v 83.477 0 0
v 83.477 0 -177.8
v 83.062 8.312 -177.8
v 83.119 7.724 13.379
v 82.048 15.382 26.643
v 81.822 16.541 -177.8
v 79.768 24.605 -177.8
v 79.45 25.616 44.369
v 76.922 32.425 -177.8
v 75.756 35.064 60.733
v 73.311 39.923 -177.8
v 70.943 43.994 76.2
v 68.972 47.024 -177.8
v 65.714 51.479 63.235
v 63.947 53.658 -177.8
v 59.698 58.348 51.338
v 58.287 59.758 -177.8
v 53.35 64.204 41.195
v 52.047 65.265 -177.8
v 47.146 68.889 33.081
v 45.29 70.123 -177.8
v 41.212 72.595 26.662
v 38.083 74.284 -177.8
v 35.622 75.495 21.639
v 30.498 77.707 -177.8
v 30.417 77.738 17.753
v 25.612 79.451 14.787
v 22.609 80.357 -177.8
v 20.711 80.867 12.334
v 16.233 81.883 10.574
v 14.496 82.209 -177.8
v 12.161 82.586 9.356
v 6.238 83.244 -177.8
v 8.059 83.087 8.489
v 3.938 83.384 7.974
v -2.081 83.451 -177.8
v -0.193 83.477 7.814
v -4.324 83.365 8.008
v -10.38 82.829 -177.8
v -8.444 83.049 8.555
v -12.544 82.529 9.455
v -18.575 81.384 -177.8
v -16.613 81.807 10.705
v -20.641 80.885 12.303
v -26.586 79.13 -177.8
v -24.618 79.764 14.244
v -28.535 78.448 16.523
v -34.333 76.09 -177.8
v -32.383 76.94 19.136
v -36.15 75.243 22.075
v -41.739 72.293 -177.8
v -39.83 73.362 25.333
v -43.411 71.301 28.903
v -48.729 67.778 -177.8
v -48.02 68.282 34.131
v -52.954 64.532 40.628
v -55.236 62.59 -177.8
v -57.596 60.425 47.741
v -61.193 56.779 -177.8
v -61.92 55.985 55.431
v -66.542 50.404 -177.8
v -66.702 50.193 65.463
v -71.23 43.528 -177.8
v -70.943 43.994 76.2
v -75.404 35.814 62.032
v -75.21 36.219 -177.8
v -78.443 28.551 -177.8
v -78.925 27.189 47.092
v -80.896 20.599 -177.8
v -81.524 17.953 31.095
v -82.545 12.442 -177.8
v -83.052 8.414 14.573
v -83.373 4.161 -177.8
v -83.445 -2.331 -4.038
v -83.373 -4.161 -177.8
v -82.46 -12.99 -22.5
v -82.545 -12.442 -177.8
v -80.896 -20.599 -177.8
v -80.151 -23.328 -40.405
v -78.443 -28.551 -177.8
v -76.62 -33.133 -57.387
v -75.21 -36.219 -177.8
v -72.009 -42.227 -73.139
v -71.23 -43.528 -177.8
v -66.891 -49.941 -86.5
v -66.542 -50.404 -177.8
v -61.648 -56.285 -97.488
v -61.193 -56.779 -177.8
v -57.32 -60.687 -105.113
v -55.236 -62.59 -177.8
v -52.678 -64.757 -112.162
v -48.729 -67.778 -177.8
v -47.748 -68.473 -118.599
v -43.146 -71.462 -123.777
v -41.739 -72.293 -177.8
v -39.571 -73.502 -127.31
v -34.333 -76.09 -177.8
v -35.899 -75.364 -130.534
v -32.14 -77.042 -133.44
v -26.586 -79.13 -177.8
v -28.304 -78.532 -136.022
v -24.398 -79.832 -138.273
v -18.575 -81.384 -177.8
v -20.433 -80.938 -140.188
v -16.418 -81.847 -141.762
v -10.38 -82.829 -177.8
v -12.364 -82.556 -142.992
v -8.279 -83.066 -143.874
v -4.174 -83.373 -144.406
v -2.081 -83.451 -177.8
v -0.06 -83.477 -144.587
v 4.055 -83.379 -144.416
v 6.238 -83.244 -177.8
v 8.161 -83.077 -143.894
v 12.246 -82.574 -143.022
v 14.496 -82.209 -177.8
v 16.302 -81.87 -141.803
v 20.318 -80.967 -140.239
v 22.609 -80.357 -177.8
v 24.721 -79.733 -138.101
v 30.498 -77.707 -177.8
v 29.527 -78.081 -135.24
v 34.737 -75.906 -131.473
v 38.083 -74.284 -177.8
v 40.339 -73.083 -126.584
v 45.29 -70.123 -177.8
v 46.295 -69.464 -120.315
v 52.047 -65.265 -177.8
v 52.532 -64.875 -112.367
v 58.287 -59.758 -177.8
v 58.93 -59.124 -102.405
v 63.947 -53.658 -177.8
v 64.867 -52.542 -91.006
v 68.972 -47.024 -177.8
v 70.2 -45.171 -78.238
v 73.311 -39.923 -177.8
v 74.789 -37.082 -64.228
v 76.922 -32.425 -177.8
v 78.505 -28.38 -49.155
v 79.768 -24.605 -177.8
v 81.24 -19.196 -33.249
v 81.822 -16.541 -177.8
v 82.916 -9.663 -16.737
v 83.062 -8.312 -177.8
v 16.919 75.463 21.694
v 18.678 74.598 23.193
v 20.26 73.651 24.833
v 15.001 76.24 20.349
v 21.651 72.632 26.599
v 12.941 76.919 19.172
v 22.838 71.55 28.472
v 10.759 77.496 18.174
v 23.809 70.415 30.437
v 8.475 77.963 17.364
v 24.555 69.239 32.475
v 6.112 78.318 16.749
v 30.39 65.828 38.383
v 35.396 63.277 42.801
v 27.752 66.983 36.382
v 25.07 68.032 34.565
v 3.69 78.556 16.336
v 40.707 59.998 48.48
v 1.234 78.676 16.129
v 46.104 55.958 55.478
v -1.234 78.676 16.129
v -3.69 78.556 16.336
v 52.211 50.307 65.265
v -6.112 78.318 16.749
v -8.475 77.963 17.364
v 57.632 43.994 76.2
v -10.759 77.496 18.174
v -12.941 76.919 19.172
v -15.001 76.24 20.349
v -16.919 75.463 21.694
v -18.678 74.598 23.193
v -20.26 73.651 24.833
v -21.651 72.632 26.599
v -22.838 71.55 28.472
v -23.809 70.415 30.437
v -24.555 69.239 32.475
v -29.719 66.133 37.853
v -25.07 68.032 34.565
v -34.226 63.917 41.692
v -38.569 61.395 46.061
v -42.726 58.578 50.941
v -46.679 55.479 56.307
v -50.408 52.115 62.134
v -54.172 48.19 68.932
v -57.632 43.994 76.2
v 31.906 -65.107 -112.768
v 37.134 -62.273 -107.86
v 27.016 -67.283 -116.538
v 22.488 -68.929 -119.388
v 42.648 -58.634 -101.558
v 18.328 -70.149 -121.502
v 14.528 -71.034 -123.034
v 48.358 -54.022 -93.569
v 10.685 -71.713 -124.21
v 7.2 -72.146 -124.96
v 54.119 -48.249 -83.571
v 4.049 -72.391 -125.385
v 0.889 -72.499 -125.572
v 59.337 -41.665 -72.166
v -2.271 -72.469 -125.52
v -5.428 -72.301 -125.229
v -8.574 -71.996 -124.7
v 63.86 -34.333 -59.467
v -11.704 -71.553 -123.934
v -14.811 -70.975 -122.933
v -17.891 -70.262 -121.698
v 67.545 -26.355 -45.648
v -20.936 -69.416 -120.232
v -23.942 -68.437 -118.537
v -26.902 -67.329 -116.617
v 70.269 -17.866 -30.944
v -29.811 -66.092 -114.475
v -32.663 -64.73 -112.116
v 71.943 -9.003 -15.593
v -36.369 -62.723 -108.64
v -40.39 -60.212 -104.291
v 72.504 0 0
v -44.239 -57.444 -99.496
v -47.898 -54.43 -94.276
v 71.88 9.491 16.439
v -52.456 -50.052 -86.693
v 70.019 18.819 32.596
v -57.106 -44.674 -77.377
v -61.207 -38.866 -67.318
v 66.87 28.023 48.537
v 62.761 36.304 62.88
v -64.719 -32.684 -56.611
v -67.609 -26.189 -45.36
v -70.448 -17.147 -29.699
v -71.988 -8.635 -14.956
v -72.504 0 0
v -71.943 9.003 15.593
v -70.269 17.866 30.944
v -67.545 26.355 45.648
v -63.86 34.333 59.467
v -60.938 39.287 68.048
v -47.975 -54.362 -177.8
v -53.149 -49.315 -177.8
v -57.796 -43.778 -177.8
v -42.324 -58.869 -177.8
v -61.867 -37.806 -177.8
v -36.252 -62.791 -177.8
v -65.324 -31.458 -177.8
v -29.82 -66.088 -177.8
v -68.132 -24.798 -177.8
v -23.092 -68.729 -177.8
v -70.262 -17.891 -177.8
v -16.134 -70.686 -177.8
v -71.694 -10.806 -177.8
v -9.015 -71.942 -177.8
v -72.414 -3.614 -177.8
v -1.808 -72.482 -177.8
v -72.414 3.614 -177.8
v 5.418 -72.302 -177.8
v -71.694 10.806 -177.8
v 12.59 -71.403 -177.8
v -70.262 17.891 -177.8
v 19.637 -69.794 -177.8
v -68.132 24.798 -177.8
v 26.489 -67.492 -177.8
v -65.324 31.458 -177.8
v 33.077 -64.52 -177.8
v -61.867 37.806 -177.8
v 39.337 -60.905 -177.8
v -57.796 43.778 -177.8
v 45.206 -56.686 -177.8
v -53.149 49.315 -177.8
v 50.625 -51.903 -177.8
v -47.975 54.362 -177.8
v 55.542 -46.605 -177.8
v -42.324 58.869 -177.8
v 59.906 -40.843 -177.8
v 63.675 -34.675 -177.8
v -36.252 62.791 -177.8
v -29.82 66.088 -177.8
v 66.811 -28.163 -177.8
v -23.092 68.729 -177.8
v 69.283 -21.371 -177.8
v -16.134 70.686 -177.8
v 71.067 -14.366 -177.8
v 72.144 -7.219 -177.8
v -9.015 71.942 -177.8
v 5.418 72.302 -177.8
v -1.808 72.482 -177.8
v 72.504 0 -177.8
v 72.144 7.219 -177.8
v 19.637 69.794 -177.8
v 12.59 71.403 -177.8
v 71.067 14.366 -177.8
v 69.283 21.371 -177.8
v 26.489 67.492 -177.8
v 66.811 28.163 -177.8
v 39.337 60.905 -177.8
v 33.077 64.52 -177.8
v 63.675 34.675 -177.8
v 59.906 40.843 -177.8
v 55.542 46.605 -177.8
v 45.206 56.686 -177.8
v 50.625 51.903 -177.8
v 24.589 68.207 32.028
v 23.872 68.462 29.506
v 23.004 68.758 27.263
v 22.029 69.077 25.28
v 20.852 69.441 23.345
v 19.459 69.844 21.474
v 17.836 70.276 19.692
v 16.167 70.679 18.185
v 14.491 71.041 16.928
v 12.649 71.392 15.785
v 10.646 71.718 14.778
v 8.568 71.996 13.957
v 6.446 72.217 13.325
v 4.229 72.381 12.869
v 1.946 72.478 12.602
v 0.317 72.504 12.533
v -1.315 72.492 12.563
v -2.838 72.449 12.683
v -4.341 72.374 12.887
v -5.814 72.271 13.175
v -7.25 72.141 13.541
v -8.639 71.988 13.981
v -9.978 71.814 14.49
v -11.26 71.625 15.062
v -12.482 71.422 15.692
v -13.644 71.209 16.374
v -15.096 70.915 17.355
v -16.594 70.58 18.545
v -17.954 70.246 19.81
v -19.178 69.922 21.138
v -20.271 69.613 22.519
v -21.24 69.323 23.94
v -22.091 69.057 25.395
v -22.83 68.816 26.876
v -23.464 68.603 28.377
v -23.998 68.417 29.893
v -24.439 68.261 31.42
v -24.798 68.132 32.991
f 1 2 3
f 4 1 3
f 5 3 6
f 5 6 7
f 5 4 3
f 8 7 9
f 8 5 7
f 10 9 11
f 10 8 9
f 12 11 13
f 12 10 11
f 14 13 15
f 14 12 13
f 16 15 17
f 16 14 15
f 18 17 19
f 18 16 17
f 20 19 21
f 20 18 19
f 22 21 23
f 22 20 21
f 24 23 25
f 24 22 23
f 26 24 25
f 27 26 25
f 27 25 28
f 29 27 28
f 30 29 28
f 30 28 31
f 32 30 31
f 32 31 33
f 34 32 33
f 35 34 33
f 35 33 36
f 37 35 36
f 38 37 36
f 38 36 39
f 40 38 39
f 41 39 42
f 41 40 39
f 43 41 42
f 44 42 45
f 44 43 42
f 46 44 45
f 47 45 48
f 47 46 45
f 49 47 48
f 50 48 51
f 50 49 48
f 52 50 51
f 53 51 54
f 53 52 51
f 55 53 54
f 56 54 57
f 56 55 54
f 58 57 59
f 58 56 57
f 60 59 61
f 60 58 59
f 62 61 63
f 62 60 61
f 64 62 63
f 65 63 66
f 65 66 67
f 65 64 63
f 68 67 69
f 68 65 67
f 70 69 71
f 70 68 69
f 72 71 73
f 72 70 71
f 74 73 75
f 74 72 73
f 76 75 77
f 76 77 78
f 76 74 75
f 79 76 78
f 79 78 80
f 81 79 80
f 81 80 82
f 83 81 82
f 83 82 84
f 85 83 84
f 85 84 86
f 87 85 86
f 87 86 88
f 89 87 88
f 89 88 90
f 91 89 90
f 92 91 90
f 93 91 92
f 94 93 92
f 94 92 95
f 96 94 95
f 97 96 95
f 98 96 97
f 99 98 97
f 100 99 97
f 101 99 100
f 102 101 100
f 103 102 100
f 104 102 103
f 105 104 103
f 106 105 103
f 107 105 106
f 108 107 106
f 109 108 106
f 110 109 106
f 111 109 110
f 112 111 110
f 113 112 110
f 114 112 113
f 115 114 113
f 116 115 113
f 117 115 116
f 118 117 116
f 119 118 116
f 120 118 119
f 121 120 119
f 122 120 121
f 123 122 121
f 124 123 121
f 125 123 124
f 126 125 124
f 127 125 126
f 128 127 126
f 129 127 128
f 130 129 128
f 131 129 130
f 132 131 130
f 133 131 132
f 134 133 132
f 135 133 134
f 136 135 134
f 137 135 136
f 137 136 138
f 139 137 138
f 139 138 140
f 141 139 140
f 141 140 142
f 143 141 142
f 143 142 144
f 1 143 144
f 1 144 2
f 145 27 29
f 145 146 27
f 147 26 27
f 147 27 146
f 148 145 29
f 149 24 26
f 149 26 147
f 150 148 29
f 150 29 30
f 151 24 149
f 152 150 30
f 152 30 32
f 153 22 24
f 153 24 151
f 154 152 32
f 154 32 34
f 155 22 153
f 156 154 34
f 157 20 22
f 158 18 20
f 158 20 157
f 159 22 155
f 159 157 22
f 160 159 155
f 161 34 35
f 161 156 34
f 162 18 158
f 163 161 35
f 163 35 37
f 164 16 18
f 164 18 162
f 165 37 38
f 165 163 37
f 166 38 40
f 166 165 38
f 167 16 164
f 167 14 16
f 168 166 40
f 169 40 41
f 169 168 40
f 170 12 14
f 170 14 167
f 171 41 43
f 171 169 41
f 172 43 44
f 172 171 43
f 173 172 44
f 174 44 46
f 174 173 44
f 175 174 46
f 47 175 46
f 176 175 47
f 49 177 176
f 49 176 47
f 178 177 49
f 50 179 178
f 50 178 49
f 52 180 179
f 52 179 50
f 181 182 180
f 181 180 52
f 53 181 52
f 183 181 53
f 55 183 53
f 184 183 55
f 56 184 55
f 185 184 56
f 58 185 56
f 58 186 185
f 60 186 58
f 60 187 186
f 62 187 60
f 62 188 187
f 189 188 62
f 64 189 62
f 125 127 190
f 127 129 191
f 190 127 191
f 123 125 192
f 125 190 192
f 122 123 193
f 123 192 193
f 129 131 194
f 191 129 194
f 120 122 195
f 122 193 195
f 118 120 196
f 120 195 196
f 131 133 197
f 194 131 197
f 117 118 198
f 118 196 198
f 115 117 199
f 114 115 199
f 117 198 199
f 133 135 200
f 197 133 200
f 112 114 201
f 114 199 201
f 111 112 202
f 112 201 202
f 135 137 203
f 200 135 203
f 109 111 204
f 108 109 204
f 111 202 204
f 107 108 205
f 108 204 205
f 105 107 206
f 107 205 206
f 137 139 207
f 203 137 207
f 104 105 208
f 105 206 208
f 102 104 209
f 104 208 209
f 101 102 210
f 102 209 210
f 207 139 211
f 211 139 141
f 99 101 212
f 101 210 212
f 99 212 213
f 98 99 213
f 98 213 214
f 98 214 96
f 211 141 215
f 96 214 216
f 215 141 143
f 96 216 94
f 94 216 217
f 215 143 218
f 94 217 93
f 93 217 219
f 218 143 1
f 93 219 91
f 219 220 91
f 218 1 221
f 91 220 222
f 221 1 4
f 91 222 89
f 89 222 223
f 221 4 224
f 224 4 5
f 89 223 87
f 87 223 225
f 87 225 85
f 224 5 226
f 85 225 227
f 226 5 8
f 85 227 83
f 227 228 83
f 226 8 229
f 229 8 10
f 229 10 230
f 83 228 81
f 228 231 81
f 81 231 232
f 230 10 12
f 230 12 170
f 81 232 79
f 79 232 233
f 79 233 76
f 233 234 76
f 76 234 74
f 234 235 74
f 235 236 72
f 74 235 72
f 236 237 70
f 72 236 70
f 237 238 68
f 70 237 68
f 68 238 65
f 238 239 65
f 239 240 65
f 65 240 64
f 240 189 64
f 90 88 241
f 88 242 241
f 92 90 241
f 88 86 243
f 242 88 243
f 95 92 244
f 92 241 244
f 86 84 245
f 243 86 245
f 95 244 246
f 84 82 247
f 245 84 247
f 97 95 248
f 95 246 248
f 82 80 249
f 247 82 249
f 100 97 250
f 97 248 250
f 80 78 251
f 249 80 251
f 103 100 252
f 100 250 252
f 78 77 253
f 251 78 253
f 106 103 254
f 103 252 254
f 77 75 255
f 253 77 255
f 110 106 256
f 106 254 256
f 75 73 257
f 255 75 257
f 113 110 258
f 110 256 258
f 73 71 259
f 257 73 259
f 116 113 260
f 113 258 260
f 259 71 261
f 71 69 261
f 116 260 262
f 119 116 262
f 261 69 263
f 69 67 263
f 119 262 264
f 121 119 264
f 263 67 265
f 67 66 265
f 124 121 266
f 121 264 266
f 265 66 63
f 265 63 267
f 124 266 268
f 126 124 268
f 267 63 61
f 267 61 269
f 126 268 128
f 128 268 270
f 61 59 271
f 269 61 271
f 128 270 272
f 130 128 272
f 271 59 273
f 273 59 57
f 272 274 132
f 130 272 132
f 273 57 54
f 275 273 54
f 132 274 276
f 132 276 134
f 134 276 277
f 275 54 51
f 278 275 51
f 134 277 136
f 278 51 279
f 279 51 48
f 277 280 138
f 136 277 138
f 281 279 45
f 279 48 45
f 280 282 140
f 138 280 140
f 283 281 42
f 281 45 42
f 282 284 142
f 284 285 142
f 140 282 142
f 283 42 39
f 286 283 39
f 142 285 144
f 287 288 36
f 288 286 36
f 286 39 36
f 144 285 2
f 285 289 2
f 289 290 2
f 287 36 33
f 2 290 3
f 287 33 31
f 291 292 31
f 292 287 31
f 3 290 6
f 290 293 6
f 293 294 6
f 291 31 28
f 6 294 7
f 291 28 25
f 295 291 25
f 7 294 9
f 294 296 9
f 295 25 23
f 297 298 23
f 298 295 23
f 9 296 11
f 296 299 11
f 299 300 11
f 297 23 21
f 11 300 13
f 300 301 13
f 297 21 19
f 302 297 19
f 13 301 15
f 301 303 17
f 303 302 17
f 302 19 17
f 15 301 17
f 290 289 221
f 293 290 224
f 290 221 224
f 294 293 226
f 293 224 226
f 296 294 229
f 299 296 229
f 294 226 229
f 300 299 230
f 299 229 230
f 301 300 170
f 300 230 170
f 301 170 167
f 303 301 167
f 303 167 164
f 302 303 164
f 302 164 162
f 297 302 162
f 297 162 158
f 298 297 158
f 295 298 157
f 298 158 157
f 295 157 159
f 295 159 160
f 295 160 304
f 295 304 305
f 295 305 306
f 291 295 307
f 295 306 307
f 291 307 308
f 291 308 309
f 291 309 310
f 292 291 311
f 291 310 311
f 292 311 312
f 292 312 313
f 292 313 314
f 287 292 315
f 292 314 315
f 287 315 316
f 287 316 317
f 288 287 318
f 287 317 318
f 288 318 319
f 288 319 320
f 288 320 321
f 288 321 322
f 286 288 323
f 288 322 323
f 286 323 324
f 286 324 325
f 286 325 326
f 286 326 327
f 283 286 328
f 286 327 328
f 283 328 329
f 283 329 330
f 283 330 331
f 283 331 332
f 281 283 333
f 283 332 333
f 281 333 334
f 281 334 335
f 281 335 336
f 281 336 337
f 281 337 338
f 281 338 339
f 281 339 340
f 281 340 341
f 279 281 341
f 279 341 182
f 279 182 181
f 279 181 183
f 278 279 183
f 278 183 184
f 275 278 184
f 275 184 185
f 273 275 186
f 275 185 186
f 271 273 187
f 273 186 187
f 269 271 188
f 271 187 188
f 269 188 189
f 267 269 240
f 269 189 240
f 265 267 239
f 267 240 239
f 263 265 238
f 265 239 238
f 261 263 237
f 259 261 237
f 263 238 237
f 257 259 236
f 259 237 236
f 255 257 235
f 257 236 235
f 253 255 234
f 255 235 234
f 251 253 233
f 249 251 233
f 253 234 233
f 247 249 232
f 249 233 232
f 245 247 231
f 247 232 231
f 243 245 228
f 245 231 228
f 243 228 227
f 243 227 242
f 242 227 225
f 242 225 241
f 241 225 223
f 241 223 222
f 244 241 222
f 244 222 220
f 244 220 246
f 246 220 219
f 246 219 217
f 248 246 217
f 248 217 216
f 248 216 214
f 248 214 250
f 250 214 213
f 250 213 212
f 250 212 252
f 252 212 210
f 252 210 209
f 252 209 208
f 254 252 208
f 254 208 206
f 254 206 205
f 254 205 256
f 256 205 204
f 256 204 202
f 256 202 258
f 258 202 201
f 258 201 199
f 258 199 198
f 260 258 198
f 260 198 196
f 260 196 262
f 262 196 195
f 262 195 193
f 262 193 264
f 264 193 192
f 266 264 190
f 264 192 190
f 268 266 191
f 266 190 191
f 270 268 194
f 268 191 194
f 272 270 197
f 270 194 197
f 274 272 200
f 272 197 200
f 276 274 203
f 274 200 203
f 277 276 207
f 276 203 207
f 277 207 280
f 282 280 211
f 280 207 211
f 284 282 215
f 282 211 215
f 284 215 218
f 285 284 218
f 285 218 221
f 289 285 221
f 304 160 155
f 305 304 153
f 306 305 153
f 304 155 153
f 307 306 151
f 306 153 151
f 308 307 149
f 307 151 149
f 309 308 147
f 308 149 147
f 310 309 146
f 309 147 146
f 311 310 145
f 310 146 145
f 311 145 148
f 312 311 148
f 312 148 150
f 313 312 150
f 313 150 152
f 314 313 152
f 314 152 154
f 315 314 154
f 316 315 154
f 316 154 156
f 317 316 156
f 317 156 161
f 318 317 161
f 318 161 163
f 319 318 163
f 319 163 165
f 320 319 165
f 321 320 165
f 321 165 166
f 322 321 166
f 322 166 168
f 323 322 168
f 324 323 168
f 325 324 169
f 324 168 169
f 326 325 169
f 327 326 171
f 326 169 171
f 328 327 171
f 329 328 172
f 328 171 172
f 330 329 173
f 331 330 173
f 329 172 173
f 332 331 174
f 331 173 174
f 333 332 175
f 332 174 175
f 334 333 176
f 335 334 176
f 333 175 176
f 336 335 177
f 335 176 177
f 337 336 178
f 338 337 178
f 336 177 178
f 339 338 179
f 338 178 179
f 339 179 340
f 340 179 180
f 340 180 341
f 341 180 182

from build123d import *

# Parameters (mm, degrees)
BOSS_EXTRUDE1_DEPTH      = 203.2
BOSS_EXTRUDE1_DEPTH_BACK = 177.8
SKETCH1_R                = 83.4771
SKETCH1_R_2              = 72.5043
SKETCH8_W                = 2032
SKETCH8_H                = 2032
CUT_EXTRUDE10_DEPTH      = 304.8
SKETCH17_W               = 203.2
SKETCH17_H               = 508
CUT_EXTRUDE14_DEPTH      = 152.4
SKETCH18_R               = 25.4
CUT_EXTRUDE15_DEPTH      = 276.539452217


with BuildPart() as part:
    # Sketch1 → Boss-Extrude1 (new, two sides: drawn at the far end of the back side and taken through both)
    with BuildSketch(Plane.XY.offset(-BOSS_EXTRUDE1_DEPTH_BACK)):
        Circle(SKETCH1_R)
        Circle(SKETCH1_R_2, mode=Mode.SUBTRACT)
    extrude(amount=BOSS_EXTRUDE1_DEPTH + BOSS_EXTRUDE1_DEPTH_BACK)

    # Sketch8 → Cut-Extrude10 (cut)
    with BuildSketch(Plane(origin=(0, 0, 0), x_dir=(-1, 0, 0), z_dir=(0, 0.866025403784438, -0.5000000000000009))):
        Rectangle(SKETCH8_W, SKETCH8_H)
    extrude(amount=-CUT_EXTRUDE10_DEPTH, mode=Mode.SUBTRACT)

    # Sketch17 → Cut-Extrude14 (cut)
    with BuildSketch(Plane(origin=(0, 65.991135768, 38.1), x_dir=(-1, 0, 0), z_dir=(0, 0.866025403784438, 0.5000000000000009))):
        Rectangle(SKETCH17_W, SKETCH17_H)
    extrude(amount=CUT_EXTRUDE14_DEPTH, mode=Mode.SUBTRACT)

    # Sketch18 → Cut-Extrude15 (cut, through all)
    with BuildSketch(Plane(origin=(0, 65.991135768, 38.1), x_dir=(1, 0, 0), z_dir=(0, 0.8660254037844382, 0.500000000000001))):
        Circle(SKETCH18_R)
    extrude(amount=-CUT_EXTRUDE15_DEPTH, mode=Mode.SUBTRACT)


solid = part.part
